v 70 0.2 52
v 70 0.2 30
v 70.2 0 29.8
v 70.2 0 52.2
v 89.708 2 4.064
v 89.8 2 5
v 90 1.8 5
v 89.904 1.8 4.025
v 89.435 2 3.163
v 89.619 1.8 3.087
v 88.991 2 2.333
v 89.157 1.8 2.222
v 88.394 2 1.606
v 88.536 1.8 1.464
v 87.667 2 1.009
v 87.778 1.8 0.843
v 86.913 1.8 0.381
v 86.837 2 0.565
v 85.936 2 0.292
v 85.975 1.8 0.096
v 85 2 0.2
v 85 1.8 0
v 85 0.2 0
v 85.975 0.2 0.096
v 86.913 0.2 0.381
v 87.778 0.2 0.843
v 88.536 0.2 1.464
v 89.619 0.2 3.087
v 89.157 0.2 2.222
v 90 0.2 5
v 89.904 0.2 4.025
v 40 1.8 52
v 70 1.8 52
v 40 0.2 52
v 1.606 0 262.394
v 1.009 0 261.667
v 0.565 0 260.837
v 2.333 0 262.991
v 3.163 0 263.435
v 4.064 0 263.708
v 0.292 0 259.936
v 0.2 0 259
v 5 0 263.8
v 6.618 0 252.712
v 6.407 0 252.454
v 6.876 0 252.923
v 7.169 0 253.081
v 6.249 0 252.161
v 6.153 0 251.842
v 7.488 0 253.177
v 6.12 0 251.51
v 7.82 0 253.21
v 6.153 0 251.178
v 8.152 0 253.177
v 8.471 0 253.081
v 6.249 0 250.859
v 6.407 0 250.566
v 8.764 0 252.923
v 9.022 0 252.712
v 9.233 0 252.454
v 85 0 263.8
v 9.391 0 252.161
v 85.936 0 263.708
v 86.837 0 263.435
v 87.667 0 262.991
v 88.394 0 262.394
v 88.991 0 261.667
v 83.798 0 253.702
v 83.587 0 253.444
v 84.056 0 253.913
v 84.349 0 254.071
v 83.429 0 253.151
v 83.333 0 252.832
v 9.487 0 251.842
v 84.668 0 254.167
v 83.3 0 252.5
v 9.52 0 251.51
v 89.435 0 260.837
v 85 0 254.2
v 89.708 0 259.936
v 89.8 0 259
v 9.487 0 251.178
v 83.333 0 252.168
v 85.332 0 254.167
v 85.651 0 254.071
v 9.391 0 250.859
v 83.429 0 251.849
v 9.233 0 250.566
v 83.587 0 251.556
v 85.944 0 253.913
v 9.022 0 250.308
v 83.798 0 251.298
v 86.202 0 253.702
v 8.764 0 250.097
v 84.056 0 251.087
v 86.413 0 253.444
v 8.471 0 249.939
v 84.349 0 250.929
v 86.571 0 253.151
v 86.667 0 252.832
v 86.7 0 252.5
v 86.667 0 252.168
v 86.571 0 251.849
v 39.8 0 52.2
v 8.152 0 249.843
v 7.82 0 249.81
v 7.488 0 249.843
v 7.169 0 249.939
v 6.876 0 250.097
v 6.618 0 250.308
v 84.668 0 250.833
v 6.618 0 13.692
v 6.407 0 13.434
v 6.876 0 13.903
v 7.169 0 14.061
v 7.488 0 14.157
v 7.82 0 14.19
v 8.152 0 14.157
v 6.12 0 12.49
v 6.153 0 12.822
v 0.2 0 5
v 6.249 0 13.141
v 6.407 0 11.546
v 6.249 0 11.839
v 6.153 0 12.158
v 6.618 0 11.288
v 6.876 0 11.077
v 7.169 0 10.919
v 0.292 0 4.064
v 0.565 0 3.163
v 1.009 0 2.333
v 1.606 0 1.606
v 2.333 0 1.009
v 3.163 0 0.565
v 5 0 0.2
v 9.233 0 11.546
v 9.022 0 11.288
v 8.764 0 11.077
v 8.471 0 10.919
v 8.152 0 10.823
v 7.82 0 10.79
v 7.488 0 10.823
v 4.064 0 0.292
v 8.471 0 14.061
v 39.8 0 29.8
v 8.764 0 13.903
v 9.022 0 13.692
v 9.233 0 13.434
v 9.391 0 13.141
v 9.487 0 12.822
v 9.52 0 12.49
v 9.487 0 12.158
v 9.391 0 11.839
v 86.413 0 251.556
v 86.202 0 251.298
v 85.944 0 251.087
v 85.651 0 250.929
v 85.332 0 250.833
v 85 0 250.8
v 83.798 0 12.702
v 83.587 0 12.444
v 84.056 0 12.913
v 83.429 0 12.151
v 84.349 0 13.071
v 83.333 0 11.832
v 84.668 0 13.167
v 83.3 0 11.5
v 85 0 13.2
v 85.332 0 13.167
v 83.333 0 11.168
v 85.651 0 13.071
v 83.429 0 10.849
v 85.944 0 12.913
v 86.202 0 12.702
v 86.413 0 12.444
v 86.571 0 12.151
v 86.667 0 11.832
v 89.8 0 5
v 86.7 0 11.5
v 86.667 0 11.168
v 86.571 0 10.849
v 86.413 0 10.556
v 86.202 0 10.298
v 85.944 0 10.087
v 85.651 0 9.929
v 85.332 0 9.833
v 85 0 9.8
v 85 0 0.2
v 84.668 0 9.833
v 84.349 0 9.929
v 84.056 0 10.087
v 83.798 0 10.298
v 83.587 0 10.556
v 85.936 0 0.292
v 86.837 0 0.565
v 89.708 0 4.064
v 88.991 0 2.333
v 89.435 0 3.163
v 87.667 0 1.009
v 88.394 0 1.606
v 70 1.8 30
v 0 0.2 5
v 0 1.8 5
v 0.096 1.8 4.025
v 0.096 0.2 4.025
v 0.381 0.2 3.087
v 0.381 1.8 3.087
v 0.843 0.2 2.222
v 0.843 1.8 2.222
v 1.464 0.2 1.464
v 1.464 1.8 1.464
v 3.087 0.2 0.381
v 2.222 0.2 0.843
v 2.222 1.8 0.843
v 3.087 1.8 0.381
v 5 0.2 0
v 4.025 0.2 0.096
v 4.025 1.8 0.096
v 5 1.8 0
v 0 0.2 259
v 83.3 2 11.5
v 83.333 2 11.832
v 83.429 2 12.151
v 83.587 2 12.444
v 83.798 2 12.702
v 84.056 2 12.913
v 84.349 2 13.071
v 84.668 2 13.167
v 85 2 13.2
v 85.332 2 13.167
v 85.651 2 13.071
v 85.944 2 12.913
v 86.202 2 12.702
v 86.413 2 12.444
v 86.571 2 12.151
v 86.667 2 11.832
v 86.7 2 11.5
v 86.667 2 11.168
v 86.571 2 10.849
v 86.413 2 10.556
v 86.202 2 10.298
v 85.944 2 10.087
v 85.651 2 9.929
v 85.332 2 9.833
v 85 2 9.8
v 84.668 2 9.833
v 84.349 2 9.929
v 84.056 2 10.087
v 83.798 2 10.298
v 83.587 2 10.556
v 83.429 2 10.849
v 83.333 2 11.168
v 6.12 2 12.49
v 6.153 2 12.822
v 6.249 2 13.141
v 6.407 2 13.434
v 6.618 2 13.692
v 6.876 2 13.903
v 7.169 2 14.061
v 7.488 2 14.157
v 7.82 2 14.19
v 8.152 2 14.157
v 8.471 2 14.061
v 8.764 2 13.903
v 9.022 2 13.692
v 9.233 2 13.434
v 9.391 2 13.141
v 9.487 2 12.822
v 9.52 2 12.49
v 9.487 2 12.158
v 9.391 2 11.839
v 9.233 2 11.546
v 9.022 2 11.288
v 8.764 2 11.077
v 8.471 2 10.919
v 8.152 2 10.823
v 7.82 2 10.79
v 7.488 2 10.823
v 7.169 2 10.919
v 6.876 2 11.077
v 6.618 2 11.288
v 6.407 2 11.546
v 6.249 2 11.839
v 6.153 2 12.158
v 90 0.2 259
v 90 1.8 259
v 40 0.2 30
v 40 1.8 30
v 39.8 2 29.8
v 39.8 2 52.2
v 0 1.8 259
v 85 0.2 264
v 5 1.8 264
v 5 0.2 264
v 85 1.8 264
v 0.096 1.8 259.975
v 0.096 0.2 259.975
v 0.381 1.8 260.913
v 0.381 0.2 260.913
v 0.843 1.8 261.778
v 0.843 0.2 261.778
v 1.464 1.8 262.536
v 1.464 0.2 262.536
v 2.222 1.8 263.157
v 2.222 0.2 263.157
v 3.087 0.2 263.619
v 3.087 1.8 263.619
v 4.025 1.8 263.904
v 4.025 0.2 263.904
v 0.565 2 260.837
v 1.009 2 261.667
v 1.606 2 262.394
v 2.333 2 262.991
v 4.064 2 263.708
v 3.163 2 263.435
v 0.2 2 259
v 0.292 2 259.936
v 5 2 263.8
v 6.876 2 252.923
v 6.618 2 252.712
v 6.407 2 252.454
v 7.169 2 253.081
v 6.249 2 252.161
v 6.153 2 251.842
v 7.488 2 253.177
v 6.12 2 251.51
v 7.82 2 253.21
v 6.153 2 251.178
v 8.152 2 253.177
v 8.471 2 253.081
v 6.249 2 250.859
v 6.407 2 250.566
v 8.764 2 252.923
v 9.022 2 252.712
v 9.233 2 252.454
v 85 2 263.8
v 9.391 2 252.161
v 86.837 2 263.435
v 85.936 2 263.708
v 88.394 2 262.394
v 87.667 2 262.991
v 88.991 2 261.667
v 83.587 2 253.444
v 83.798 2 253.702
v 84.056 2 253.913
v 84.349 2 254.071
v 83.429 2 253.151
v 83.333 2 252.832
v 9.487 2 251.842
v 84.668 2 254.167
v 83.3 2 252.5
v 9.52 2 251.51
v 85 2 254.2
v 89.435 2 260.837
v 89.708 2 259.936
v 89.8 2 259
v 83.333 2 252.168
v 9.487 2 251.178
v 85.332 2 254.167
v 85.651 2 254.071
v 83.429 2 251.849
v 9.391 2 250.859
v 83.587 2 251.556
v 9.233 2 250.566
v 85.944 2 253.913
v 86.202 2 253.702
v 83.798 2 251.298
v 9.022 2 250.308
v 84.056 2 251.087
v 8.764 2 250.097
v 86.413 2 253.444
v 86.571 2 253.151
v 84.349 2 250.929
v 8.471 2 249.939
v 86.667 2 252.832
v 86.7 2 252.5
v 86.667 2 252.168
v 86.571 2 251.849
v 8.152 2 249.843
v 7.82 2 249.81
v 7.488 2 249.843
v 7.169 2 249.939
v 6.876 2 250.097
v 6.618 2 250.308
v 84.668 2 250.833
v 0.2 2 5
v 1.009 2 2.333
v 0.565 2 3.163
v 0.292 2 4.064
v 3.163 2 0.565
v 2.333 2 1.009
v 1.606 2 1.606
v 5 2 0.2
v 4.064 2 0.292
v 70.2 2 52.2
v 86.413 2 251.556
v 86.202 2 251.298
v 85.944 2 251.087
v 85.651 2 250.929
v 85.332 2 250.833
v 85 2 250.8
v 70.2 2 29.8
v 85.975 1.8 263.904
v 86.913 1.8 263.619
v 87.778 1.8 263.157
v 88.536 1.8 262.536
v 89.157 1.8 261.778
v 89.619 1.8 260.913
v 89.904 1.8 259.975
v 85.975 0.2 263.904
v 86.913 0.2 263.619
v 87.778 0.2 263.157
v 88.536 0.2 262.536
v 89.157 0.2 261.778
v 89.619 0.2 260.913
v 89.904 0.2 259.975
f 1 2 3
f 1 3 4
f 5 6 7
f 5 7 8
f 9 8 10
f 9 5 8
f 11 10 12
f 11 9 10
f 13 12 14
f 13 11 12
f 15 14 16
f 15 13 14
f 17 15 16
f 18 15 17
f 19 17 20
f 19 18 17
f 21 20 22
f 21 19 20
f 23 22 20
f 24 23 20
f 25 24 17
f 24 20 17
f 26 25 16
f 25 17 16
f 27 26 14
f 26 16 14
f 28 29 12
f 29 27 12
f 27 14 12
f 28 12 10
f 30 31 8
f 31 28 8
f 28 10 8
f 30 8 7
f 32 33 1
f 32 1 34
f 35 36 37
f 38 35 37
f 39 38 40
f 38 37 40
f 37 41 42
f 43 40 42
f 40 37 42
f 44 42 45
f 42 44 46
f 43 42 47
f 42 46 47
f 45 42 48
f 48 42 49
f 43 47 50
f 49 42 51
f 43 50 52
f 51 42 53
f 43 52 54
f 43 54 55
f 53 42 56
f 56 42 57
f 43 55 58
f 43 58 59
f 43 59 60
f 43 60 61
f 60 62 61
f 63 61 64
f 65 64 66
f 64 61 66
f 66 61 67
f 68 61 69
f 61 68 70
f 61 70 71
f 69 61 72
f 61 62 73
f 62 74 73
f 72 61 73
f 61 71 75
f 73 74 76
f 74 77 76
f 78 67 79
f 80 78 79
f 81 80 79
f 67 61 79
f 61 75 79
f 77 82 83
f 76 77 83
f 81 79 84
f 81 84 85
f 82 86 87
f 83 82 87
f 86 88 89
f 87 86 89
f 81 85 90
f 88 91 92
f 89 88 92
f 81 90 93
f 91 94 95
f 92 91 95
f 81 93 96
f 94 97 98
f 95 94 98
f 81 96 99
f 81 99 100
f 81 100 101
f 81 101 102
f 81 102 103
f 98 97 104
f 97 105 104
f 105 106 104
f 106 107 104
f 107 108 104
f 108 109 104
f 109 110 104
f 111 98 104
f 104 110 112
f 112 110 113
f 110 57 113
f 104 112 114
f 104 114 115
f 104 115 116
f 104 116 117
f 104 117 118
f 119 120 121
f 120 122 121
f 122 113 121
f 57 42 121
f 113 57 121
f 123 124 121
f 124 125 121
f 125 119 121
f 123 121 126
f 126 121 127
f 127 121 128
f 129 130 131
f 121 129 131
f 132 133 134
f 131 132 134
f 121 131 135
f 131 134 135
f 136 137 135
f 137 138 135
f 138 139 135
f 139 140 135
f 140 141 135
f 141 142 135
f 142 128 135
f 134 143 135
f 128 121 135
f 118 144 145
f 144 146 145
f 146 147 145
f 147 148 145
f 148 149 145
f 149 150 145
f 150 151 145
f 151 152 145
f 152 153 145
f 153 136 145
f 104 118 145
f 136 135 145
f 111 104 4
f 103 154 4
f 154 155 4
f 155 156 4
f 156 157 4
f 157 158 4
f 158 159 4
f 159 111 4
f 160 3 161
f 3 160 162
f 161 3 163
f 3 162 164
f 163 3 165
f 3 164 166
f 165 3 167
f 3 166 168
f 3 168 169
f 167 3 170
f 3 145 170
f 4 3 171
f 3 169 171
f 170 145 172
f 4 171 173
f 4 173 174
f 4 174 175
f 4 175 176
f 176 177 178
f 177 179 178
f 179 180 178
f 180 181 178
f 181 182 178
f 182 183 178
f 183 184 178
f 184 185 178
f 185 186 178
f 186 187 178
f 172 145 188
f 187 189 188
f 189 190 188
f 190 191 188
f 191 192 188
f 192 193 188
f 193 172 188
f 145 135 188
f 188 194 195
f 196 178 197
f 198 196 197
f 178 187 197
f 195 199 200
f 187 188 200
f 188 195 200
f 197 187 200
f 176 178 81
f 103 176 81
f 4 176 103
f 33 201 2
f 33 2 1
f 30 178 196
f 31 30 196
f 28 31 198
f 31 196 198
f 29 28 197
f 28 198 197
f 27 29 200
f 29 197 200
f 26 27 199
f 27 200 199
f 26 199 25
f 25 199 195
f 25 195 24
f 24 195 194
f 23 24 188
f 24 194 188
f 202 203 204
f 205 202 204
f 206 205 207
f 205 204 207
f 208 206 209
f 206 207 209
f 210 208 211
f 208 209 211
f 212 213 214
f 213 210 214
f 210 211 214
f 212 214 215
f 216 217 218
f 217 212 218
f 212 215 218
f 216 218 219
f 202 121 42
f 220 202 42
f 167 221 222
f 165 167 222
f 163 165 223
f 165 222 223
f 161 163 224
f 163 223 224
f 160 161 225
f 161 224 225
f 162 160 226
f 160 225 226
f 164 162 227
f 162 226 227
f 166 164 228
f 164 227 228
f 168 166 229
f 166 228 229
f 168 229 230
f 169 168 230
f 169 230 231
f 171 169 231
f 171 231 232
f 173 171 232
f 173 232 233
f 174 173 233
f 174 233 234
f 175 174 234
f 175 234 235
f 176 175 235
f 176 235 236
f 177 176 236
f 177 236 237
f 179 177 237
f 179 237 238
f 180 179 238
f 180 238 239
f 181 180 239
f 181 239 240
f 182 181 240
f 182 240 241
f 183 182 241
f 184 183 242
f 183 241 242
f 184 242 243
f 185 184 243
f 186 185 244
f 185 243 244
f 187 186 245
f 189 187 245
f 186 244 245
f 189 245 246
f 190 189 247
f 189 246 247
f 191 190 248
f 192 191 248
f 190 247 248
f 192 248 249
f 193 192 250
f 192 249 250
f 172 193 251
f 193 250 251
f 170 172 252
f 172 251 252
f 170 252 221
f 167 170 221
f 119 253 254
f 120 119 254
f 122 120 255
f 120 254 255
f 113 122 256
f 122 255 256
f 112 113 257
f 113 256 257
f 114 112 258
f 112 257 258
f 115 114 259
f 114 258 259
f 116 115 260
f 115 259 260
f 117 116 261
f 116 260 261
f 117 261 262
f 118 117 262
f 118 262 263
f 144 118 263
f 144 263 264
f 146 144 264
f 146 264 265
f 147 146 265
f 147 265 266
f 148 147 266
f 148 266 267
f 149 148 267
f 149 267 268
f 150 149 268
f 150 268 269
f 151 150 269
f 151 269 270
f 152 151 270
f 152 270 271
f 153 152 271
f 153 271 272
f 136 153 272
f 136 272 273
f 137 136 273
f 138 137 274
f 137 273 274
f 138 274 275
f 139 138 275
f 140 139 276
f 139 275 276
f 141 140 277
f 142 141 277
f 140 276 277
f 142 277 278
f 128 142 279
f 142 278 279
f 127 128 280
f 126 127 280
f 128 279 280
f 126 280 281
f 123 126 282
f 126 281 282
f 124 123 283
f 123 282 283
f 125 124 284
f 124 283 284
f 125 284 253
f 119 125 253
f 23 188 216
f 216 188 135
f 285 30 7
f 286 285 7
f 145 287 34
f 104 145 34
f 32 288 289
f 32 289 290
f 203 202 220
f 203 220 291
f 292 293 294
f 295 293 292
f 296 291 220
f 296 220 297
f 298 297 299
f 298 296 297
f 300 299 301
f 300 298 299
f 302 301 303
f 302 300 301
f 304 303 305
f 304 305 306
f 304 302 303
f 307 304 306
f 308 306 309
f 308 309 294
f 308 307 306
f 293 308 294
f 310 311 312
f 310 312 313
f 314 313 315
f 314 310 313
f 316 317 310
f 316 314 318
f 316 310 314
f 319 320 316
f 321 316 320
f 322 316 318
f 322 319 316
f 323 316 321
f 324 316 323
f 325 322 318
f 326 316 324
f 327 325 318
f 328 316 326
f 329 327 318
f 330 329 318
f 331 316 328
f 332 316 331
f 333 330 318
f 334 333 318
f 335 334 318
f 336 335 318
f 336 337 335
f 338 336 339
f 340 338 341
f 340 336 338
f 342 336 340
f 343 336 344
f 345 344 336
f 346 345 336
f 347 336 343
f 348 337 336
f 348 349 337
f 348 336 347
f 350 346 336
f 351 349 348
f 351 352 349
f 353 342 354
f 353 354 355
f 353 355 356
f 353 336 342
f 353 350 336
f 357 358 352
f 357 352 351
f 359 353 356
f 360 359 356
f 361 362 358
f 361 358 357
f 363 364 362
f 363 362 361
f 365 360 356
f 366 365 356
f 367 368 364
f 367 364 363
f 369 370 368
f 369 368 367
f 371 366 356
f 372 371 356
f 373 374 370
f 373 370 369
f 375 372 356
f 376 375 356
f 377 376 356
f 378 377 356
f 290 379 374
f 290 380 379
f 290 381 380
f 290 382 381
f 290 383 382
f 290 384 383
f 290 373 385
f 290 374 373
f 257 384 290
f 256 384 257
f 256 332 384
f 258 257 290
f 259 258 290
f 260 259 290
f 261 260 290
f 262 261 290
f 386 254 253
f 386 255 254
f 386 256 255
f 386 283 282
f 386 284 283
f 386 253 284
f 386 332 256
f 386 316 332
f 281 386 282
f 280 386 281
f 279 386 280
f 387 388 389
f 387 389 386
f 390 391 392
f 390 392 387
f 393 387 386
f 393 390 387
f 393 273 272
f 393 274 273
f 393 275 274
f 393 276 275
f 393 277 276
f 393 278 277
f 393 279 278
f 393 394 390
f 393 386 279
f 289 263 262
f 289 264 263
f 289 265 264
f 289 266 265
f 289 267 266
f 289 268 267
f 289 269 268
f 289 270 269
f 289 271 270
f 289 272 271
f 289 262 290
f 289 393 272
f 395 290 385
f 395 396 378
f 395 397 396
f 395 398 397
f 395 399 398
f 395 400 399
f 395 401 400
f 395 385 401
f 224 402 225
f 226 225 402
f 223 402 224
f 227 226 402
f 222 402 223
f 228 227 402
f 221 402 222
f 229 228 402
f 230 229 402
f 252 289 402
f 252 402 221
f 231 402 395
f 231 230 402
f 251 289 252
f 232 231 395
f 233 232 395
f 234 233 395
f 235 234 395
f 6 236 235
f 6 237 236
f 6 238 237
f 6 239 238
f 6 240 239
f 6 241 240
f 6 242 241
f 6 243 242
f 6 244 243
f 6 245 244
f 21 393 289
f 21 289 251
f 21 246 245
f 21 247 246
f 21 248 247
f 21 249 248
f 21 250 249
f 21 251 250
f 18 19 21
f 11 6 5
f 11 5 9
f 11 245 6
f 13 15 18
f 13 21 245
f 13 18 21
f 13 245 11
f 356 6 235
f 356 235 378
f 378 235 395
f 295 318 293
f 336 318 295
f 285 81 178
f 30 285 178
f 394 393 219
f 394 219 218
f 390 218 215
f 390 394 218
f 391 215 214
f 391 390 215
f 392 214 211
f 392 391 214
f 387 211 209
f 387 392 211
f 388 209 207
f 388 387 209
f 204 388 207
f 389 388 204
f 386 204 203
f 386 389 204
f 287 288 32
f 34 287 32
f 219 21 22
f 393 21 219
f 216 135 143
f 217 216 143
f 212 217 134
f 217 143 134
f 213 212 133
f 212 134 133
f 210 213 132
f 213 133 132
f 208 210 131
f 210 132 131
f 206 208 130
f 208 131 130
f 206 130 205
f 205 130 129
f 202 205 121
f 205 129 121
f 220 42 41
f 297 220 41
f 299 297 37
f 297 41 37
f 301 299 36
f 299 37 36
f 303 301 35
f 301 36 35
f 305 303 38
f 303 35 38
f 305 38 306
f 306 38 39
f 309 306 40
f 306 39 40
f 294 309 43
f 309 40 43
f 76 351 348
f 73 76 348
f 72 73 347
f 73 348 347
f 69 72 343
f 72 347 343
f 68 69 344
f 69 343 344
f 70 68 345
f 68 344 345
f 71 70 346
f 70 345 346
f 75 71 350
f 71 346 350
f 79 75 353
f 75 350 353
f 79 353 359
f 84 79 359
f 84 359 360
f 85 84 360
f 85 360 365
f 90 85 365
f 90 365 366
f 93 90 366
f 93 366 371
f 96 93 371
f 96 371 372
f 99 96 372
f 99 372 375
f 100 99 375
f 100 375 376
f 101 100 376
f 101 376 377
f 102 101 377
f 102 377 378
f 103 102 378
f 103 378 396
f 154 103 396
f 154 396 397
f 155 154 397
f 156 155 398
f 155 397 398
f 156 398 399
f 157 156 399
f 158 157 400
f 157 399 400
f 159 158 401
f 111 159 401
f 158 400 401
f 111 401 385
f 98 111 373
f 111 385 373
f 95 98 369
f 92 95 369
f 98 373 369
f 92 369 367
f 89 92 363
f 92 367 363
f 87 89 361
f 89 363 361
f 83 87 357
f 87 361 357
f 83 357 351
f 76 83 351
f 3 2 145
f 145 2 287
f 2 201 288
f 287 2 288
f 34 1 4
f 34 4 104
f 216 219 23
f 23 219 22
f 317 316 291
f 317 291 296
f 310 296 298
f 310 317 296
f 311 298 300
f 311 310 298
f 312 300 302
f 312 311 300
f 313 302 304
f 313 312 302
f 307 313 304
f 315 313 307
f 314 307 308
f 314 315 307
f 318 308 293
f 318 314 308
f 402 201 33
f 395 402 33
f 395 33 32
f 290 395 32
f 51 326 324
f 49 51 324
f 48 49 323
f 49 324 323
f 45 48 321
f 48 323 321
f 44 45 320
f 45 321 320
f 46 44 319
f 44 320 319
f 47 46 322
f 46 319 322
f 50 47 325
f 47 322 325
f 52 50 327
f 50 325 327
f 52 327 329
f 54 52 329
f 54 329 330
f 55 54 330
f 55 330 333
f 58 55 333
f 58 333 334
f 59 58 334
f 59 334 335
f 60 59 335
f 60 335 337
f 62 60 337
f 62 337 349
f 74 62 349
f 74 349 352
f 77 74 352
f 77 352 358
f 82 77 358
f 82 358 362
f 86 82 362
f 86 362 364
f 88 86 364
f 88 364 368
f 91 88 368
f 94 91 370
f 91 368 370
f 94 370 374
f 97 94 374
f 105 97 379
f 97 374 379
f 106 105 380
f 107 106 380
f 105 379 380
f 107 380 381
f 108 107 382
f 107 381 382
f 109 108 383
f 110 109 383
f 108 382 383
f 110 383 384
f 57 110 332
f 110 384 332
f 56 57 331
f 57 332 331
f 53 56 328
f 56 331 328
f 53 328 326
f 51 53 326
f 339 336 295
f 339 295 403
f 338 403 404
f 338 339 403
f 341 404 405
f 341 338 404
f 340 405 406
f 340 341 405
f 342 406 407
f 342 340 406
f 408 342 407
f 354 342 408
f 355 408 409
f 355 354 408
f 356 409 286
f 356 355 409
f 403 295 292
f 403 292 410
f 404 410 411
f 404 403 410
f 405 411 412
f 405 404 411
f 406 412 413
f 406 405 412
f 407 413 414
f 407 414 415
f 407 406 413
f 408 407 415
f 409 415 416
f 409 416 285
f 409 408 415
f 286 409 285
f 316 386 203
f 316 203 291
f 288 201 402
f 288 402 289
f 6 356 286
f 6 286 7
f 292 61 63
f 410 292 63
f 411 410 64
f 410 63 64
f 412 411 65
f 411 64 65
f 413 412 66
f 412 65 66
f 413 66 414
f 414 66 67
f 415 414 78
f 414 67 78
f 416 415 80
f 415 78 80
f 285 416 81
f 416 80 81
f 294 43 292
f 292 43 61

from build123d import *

# Parameters (mm, degrees)
ESQUISSE1_W             = 90
ESQUISSE1_H             = 2
BASE_EXTRUSION_DEPTH    = 264
ESQUISSE2_W             = 30
ESQUISSE2_H             = 22
ENL_V_MAT_EXTRU_1_DEPTH = 279.92651362
CONG_1_R                = 5
CHANFREIN1_SIZE         = 0.2
ESQUISSE3_R             = 1.7
ENL_V_MAT_EXTRU_2_DEPTH = 279.92651362


with BuildPart() as part:
    # Esquisse1 → Base-Extrusion (new body)
    with BuildSketch(Plane.XY):
        with Locations((45, 1)):
            Rectangle(ESQUISSE1_W, ESQUISSE1_H)
    extrude(amount=BASE_EXTRUSION_DEPTH)

    # Esquisse2 → Enlèv. mat.-Extru.1 (cut, through all)
    with BuildSketch(Plane(origin=(0, 2, 0), x_dir=(-1, 0, 0), z_dir=(0, 1, 0))):
        with Locations((-55, 41)):
            Rectangle(ESQUISSE2_W, ESQUISSE2_H)
    extrude(amount=-ENL_V_MAT_EXTRU_1_DEPTH, mode=Mode.SUBTRACT)

    # Congé1
    cong_1_edges = [part.edges().sort_by_distance(p)[0] for p in [
        (0, 1, 0),
        (0, 1, 264),
        (90, 1, 0),
        (90, 1, 264),
    ]]
    fillet(cong_1_edges, radius=CONG_1_R)

    # Chanfrein1
    chanfrein1_edges = [part.edges().sort_by_distance(p)[0] for p in [
        (0, 0, 132),
        (1.464466094, 0, 1.464466094),
        (1.464466094, 0, 262.535533906),
        (45, 0, 0),
        (45, 0, 264),
        (88.535533906, 0, 1.464466094),
        (88.535533906, 0, 262.535533906),
        (90, 0, 132),
        (70, 0, 41),
        (55, 0, 30),
        (40, 0, 41),
        (55, 0, 52),
        (0, 2, 132),
        (1.464466094, 2, 1.464466094),
        (1.464466094, 2, 262.535533906),
        (45, 2, 0),
        (45, 2, 264),
        (88.535533906, 2, 1.464466094),
        (88.535533906, 2, 262.535533906),
        (90, 2, 132),
        (70, 2, 41),
        (55, 2, 30),
        (40, 2, 41),
        (55, 2, 52),
    ]]
    chamfer(chanfrein1_edges, length=CHANFREIN1_SIZE)

    # Esquisse3 → Enlèv. mat.-Extru.2 (cut, through all)
    with BuildSketch(Plane(origin=(0, 2, 0), x_dir=(-1, 0, 0), z_dir=(0, 1, 0))):
        with Locations((-7.82, 251.51)):
            Circle(ESQUISSE3_R)
        with Locations((-7.82, 12.49)):
            Circle(ESQUISSE3_R)
        with Locations((-85, 252.5)):
            Circle(ESQUISSE3_R)
        with Locations((-85, 11.5)):
            Circle(ESQUISSE3_R)
    extrude(amount=-ENL_V_MAT_EXTRU_2_DEPTH, mode=Mode.SUBTRACT)


solid = part.part
